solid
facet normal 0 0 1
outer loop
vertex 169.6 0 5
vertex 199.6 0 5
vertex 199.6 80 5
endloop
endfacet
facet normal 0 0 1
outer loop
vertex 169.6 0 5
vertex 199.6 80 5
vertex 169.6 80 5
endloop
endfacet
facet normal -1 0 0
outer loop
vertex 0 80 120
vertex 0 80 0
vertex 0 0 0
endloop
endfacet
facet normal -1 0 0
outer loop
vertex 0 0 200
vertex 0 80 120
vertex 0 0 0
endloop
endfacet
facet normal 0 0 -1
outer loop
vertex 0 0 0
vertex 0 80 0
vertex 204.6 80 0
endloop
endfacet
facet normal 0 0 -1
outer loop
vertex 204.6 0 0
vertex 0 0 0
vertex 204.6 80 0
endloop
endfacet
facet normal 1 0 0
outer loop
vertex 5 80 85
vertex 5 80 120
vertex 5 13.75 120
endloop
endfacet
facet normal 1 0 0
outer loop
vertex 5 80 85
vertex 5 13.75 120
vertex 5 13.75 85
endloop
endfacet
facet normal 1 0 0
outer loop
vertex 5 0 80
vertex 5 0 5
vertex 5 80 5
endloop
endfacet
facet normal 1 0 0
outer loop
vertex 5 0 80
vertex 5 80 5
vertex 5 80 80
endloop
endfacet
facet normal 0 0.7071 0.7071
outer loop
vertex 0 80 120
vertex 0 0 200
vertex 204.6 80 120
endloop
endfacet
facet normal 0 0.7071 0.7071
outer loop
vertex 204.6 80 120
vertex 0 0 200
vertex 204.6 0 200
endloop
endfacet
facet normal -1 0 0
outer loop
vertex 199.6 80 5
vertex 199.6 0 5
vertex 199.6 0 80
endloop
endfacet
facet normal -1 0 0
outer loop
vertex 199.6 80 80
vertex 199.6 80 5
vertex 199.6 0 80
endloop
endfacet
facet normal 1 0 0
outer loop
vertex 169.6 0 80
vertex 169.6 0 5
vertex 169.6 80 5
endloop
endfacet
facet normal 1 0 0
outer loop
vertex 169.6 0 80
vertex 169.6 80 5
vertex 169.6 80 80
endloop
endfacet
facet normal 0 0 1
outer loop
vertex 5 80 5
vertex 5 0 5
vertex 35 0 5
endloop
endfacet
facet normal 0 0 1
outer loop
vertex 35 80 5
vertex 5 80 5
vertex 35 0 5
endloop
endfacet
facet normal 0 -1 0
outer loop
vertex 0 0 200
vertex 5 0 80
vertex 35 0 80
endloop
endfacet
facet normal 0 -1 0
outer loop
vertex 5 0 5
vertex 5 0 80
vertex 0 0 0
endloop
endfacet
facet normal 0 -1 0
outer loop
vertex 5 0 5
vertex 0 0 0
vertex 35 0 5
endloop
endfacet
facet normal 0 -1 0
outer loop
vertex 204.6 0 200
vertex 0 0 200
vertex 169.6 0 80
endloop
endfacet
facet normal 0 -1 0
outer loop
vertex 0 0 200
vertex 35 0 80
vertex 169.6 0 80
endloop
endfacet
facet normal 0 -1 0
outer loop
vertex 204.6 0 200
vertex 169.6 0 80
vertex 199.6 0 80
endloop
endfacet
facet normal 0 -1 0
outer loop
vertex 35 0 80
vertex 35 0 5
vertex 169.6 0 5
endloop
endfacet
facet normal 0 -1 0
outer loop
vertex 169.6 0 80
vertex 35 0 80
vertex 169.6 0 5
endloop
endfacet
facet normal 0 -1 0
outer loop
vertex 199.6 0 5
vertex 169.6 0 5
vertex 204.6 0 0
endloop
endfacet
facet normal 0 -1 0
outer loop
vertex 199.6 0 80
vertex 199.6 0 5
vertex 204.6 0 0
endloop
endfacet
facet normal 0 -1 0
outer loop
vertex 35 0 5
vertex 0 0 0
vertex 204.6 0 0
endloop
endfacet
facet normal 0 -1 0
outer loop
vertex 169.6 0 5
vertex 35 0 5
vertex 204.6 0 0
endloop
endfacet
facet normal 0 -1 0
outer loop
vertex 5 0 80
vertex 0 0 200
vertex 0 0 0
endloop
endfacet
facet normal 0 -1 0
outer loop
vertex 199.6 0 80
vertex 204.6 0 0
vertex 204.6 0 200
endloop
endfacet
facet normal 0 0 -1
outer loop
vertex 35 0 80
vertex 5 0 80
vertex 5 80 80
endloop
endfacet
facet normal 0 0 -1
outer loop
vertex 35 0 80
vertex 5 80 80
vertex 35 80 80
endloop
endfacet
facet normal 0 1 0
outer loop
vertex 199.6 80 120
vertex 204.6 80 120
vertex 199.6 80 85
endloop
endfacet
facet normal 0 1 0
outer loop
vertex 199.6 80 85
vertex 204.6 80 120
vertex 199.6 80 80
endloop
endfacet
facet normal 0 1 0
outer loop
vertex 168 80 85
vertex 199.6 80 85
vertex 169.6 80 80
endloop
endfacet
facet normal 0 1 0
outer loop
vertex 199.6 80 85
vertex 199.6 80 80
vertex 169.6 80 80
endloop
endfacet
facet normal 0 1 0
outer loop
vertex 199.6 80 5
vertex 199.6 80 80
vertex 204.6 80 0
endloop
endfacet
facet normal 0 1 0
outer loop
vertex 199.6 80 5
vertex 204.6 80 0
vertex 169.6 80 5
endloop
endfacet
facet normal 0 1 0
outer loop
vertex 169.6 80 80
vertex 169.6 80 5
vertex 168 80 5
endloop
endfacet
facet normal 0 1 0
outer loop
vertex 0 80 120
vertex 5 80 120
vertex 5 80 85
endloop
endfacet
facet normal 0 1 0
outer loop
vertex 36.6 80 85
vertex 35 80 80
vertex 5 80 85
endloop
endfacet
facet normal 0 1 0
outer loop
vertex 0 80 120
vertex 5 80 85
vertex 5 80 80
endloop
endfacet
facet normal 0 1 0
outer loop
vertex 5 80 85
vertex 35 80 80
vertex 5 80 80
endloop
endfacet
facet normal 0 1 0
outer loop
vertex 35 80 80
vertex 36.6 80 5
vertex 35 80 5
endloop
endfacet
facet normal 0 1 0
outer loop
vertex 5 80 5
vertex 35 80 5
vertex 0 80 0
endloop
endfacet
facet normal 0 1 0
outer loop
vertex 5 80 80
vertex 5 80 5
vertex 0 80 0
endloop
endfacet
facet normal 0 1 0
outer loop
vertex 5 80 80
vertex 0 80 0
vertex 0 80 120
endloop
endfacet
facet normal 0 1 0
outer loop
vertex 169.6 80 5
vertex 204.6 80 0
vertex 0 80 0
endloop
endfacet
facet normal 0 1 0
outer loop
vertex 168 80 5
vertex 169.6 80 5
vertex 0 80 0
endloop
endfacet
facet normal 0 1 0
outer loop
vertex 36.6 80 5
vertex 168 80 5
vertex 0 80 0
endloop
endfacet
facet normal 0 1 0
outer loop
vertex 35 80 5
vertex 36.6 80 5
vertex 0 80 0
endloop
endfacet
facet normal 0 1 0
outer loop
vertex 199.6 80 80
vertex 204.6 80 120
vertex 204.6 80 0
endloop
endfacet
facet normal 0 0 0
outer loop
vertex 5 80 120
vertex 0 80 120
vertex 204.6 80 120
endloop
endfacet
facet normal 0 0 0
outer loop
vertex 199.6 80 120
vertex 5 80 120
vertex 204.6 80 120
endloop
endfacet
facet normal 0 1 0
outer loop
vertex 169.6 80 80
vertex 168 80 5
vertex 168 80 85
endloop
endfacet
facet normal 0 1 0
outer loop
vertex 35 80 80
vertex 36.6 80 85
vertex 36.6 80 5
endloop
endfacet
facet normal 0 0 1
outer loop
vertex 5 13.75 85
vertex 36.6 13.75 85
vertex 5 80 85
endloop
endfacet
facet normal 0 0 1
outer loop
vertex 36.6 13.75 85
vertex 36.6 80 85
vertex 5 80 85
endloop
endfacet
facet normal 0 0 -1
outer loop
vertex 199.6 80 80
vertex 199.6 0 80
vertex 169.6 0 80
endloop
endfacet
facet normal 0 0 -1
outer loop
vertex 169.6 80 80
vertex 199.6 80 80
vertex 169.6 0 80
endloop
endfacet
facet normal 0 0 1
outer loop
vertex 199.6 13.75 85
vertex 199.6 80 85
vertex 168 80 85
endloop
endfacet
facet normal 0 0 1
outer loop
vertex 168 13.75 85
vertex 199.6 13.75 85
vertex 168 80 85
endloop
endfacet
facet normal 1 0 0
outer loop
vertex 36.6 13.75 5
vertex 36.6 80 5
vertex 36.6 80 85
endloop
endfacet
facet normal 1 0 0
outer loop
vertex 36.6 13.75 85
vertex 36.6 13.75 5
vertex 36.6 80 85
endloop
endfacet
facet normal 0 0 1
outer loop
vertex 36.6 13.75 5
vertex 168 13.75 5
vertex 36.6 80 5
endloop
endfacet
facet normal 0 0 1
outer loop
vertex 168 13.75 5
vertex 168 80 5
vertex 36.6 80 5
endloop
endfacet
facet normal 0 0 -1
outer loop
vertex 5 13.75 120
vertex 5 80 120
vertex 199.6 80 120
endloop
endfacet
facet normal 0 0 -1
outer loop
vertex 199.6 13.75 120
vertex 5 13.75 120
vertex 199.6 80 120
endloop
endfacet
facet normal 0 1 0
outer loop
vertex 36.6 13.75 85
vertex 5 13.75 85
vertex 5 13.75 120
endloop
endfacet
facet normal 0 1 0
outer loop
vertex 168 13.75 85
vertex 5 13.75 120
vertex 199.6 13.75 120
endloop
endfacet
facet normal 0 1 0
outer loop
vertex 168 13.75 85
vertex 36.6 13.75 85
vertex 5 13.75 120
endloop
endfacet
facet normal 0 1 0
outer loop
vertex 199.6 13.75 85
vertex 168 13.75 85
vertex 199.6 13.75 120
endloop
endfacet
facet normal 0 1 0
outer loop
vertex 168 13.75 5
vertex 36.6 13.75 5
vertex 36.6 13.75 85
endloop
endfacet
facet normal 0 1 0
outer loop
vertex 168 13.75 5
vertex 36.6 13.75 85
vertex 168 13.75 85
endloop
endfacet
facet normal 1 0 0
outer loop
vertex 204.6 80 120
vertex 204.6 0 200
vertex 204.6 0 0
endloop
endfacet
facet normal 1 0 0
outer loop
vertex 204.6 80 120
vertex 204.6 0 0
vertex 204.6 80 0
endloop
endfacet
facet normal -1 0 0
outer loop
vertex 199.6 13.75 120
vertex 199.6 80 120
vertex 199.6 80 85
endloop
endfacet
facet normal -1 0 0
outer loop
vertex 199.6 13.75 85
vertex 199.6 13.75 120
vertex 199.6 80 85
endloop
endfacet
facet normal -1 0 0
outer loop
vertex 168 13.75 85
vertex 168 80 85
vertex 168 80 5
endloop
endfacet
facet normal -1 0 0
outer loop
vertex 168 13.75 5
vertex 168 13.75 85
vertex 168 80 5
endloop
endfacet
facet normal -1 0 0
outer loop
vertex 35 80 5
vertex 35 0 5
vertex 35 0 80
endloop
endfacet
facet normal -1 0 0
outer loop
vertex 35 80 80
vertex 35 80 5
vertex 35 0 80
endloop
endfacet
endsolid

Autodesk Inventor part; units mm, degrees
ref_plane "YZ Plane" through (0, 0, 0) normal (1, 0, 0) x (0, 1, 0)
ref_plane "XZ Plane" through (0, 0, 0) normal (0, 1, 0) x (-1, 0, 0)
ref_plane "XY Plane" through (0, 0, 0) normal (0, 0, 1) x (1, 0, 0)
sketch "Esboço3" plane through (0, 0, 0) normal (0, 0, 1) x (1, 0, 0)
  line L0 (0, 0) -> (204.6, 0)
  line L1 (204.6, 0) -> (204.6, 80)
  line L2 (204.6, 80) -> (0, 80)
  line L3 (0, 80) -> (0, 0)
  dimension "d4" = 204.6
  dimension "d5" = 80
extrude "Extrusão2" add sketch "Esboço3" along normal blind 200
sketch "Esboço7" plane through (0, 80, 0) normal (0, 1, 0) x (1, 0, 0)
  line L0 (0, 0) -> (5, 0)
  line L1 (0, 0) -> (204.6, 0) projected
  line L2 (5, -5) -> (5, -80)
  line L3 (5, -80) -> (35, -80)
  line L4 (5, -5) -> (35, -5)
  line L5 (35, -5) -> (35, -80)
  line L6 (35, -80) -> (5, -80)
  line L7 (5, -80) -> (5, -5)
  line L8 (204.6, 0) -> (204.6, -200) projected
  line L9 (199.6, -5) -> (199.6, -80)
  line L10 (199.6, -80) -> (169.6, -80)
  line L11 (199.6, -5) -> (169.6, -5)
  line L12 (169.6, -5) -> (169.6, -80)
  line L13 (169.6, -80) -> (199.6, -80)
  line L14 (199.6, -80) -> (199.6, -5)
extrude "Extrusão3" cut sketch "Esboço7" against normal through all
sketch "Esboço8" plane through (0, 80, 0) normal (0, 1, 0) x (1, 0, 0)
  line L0 (35, -5) -> (35, -80) projected
  line L1 (35, -80) -> (36.6, -80)
  line L2 (169.6, -80) -> (168, -80)
  line L3 (45.7132, 0) -> (45.7132, -5)
  line L4 (0, 0) -> (204.6, 0) projected
  line L5 (36.6, -80) -> (168, -80)
  line L6 (168, -80) -> (168, -5)
  line L7 (168, -5) -> (36.6, -5)
  line L8 (36.6, -5) -> (36.6, -80)
  dimension "d29" = 1.6
  dimension "d30" = 1.6
extrude "Extrusão4" cut sketch "Esboço8" against normal blind 66.25
sketch "Esboço9" plane through (0, 80, 0) normal (0, 1, 0) x (1, 0, 0)
  line L0 (35, -80) -> (5, -80) projected
  line L1 (168, -80) -> (36.6, -80) projected
  line L2 (36.6, -80) -> (36.6, -85)
  line L3 (168, -80) -> (168, -85)
  line L4 (199.6, -80) -> (169.6, -80) projected
  line L5 (5, -120) -> (5, -85)
  line L6 (36.6, -85) -> (5, -85)
  line L7 (5, -120) -> (140.4393, -120)
  line L8 (199.6, -85) -> (168, -85)
  line L9 (36.6, -80) -> (168, -80)
  line L10 (140.4393, -120) -> (199.6, -120)
  line L11 (199.6, -120) -> (199.6, -85)
extrude "Extrusão5" cut sketch "Esboço9" against normal blind 66.25
chamfer "Chanfro1" distance 80 angle 45 1 edges at (102.3, 80, 200)
properties part number "chassi1"
